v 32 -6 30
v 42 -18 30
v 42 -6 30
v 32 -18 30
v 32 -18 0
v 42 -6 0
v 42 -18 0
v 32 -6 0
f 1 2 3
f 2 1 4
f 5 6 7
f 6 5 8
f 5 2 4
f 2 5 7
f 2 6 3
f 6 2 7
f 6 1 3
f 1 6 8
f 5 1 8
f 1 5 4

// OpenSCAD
intersection() {
    translate([32,-18,0]) {
        cube([10,12,30]);
    };
}
